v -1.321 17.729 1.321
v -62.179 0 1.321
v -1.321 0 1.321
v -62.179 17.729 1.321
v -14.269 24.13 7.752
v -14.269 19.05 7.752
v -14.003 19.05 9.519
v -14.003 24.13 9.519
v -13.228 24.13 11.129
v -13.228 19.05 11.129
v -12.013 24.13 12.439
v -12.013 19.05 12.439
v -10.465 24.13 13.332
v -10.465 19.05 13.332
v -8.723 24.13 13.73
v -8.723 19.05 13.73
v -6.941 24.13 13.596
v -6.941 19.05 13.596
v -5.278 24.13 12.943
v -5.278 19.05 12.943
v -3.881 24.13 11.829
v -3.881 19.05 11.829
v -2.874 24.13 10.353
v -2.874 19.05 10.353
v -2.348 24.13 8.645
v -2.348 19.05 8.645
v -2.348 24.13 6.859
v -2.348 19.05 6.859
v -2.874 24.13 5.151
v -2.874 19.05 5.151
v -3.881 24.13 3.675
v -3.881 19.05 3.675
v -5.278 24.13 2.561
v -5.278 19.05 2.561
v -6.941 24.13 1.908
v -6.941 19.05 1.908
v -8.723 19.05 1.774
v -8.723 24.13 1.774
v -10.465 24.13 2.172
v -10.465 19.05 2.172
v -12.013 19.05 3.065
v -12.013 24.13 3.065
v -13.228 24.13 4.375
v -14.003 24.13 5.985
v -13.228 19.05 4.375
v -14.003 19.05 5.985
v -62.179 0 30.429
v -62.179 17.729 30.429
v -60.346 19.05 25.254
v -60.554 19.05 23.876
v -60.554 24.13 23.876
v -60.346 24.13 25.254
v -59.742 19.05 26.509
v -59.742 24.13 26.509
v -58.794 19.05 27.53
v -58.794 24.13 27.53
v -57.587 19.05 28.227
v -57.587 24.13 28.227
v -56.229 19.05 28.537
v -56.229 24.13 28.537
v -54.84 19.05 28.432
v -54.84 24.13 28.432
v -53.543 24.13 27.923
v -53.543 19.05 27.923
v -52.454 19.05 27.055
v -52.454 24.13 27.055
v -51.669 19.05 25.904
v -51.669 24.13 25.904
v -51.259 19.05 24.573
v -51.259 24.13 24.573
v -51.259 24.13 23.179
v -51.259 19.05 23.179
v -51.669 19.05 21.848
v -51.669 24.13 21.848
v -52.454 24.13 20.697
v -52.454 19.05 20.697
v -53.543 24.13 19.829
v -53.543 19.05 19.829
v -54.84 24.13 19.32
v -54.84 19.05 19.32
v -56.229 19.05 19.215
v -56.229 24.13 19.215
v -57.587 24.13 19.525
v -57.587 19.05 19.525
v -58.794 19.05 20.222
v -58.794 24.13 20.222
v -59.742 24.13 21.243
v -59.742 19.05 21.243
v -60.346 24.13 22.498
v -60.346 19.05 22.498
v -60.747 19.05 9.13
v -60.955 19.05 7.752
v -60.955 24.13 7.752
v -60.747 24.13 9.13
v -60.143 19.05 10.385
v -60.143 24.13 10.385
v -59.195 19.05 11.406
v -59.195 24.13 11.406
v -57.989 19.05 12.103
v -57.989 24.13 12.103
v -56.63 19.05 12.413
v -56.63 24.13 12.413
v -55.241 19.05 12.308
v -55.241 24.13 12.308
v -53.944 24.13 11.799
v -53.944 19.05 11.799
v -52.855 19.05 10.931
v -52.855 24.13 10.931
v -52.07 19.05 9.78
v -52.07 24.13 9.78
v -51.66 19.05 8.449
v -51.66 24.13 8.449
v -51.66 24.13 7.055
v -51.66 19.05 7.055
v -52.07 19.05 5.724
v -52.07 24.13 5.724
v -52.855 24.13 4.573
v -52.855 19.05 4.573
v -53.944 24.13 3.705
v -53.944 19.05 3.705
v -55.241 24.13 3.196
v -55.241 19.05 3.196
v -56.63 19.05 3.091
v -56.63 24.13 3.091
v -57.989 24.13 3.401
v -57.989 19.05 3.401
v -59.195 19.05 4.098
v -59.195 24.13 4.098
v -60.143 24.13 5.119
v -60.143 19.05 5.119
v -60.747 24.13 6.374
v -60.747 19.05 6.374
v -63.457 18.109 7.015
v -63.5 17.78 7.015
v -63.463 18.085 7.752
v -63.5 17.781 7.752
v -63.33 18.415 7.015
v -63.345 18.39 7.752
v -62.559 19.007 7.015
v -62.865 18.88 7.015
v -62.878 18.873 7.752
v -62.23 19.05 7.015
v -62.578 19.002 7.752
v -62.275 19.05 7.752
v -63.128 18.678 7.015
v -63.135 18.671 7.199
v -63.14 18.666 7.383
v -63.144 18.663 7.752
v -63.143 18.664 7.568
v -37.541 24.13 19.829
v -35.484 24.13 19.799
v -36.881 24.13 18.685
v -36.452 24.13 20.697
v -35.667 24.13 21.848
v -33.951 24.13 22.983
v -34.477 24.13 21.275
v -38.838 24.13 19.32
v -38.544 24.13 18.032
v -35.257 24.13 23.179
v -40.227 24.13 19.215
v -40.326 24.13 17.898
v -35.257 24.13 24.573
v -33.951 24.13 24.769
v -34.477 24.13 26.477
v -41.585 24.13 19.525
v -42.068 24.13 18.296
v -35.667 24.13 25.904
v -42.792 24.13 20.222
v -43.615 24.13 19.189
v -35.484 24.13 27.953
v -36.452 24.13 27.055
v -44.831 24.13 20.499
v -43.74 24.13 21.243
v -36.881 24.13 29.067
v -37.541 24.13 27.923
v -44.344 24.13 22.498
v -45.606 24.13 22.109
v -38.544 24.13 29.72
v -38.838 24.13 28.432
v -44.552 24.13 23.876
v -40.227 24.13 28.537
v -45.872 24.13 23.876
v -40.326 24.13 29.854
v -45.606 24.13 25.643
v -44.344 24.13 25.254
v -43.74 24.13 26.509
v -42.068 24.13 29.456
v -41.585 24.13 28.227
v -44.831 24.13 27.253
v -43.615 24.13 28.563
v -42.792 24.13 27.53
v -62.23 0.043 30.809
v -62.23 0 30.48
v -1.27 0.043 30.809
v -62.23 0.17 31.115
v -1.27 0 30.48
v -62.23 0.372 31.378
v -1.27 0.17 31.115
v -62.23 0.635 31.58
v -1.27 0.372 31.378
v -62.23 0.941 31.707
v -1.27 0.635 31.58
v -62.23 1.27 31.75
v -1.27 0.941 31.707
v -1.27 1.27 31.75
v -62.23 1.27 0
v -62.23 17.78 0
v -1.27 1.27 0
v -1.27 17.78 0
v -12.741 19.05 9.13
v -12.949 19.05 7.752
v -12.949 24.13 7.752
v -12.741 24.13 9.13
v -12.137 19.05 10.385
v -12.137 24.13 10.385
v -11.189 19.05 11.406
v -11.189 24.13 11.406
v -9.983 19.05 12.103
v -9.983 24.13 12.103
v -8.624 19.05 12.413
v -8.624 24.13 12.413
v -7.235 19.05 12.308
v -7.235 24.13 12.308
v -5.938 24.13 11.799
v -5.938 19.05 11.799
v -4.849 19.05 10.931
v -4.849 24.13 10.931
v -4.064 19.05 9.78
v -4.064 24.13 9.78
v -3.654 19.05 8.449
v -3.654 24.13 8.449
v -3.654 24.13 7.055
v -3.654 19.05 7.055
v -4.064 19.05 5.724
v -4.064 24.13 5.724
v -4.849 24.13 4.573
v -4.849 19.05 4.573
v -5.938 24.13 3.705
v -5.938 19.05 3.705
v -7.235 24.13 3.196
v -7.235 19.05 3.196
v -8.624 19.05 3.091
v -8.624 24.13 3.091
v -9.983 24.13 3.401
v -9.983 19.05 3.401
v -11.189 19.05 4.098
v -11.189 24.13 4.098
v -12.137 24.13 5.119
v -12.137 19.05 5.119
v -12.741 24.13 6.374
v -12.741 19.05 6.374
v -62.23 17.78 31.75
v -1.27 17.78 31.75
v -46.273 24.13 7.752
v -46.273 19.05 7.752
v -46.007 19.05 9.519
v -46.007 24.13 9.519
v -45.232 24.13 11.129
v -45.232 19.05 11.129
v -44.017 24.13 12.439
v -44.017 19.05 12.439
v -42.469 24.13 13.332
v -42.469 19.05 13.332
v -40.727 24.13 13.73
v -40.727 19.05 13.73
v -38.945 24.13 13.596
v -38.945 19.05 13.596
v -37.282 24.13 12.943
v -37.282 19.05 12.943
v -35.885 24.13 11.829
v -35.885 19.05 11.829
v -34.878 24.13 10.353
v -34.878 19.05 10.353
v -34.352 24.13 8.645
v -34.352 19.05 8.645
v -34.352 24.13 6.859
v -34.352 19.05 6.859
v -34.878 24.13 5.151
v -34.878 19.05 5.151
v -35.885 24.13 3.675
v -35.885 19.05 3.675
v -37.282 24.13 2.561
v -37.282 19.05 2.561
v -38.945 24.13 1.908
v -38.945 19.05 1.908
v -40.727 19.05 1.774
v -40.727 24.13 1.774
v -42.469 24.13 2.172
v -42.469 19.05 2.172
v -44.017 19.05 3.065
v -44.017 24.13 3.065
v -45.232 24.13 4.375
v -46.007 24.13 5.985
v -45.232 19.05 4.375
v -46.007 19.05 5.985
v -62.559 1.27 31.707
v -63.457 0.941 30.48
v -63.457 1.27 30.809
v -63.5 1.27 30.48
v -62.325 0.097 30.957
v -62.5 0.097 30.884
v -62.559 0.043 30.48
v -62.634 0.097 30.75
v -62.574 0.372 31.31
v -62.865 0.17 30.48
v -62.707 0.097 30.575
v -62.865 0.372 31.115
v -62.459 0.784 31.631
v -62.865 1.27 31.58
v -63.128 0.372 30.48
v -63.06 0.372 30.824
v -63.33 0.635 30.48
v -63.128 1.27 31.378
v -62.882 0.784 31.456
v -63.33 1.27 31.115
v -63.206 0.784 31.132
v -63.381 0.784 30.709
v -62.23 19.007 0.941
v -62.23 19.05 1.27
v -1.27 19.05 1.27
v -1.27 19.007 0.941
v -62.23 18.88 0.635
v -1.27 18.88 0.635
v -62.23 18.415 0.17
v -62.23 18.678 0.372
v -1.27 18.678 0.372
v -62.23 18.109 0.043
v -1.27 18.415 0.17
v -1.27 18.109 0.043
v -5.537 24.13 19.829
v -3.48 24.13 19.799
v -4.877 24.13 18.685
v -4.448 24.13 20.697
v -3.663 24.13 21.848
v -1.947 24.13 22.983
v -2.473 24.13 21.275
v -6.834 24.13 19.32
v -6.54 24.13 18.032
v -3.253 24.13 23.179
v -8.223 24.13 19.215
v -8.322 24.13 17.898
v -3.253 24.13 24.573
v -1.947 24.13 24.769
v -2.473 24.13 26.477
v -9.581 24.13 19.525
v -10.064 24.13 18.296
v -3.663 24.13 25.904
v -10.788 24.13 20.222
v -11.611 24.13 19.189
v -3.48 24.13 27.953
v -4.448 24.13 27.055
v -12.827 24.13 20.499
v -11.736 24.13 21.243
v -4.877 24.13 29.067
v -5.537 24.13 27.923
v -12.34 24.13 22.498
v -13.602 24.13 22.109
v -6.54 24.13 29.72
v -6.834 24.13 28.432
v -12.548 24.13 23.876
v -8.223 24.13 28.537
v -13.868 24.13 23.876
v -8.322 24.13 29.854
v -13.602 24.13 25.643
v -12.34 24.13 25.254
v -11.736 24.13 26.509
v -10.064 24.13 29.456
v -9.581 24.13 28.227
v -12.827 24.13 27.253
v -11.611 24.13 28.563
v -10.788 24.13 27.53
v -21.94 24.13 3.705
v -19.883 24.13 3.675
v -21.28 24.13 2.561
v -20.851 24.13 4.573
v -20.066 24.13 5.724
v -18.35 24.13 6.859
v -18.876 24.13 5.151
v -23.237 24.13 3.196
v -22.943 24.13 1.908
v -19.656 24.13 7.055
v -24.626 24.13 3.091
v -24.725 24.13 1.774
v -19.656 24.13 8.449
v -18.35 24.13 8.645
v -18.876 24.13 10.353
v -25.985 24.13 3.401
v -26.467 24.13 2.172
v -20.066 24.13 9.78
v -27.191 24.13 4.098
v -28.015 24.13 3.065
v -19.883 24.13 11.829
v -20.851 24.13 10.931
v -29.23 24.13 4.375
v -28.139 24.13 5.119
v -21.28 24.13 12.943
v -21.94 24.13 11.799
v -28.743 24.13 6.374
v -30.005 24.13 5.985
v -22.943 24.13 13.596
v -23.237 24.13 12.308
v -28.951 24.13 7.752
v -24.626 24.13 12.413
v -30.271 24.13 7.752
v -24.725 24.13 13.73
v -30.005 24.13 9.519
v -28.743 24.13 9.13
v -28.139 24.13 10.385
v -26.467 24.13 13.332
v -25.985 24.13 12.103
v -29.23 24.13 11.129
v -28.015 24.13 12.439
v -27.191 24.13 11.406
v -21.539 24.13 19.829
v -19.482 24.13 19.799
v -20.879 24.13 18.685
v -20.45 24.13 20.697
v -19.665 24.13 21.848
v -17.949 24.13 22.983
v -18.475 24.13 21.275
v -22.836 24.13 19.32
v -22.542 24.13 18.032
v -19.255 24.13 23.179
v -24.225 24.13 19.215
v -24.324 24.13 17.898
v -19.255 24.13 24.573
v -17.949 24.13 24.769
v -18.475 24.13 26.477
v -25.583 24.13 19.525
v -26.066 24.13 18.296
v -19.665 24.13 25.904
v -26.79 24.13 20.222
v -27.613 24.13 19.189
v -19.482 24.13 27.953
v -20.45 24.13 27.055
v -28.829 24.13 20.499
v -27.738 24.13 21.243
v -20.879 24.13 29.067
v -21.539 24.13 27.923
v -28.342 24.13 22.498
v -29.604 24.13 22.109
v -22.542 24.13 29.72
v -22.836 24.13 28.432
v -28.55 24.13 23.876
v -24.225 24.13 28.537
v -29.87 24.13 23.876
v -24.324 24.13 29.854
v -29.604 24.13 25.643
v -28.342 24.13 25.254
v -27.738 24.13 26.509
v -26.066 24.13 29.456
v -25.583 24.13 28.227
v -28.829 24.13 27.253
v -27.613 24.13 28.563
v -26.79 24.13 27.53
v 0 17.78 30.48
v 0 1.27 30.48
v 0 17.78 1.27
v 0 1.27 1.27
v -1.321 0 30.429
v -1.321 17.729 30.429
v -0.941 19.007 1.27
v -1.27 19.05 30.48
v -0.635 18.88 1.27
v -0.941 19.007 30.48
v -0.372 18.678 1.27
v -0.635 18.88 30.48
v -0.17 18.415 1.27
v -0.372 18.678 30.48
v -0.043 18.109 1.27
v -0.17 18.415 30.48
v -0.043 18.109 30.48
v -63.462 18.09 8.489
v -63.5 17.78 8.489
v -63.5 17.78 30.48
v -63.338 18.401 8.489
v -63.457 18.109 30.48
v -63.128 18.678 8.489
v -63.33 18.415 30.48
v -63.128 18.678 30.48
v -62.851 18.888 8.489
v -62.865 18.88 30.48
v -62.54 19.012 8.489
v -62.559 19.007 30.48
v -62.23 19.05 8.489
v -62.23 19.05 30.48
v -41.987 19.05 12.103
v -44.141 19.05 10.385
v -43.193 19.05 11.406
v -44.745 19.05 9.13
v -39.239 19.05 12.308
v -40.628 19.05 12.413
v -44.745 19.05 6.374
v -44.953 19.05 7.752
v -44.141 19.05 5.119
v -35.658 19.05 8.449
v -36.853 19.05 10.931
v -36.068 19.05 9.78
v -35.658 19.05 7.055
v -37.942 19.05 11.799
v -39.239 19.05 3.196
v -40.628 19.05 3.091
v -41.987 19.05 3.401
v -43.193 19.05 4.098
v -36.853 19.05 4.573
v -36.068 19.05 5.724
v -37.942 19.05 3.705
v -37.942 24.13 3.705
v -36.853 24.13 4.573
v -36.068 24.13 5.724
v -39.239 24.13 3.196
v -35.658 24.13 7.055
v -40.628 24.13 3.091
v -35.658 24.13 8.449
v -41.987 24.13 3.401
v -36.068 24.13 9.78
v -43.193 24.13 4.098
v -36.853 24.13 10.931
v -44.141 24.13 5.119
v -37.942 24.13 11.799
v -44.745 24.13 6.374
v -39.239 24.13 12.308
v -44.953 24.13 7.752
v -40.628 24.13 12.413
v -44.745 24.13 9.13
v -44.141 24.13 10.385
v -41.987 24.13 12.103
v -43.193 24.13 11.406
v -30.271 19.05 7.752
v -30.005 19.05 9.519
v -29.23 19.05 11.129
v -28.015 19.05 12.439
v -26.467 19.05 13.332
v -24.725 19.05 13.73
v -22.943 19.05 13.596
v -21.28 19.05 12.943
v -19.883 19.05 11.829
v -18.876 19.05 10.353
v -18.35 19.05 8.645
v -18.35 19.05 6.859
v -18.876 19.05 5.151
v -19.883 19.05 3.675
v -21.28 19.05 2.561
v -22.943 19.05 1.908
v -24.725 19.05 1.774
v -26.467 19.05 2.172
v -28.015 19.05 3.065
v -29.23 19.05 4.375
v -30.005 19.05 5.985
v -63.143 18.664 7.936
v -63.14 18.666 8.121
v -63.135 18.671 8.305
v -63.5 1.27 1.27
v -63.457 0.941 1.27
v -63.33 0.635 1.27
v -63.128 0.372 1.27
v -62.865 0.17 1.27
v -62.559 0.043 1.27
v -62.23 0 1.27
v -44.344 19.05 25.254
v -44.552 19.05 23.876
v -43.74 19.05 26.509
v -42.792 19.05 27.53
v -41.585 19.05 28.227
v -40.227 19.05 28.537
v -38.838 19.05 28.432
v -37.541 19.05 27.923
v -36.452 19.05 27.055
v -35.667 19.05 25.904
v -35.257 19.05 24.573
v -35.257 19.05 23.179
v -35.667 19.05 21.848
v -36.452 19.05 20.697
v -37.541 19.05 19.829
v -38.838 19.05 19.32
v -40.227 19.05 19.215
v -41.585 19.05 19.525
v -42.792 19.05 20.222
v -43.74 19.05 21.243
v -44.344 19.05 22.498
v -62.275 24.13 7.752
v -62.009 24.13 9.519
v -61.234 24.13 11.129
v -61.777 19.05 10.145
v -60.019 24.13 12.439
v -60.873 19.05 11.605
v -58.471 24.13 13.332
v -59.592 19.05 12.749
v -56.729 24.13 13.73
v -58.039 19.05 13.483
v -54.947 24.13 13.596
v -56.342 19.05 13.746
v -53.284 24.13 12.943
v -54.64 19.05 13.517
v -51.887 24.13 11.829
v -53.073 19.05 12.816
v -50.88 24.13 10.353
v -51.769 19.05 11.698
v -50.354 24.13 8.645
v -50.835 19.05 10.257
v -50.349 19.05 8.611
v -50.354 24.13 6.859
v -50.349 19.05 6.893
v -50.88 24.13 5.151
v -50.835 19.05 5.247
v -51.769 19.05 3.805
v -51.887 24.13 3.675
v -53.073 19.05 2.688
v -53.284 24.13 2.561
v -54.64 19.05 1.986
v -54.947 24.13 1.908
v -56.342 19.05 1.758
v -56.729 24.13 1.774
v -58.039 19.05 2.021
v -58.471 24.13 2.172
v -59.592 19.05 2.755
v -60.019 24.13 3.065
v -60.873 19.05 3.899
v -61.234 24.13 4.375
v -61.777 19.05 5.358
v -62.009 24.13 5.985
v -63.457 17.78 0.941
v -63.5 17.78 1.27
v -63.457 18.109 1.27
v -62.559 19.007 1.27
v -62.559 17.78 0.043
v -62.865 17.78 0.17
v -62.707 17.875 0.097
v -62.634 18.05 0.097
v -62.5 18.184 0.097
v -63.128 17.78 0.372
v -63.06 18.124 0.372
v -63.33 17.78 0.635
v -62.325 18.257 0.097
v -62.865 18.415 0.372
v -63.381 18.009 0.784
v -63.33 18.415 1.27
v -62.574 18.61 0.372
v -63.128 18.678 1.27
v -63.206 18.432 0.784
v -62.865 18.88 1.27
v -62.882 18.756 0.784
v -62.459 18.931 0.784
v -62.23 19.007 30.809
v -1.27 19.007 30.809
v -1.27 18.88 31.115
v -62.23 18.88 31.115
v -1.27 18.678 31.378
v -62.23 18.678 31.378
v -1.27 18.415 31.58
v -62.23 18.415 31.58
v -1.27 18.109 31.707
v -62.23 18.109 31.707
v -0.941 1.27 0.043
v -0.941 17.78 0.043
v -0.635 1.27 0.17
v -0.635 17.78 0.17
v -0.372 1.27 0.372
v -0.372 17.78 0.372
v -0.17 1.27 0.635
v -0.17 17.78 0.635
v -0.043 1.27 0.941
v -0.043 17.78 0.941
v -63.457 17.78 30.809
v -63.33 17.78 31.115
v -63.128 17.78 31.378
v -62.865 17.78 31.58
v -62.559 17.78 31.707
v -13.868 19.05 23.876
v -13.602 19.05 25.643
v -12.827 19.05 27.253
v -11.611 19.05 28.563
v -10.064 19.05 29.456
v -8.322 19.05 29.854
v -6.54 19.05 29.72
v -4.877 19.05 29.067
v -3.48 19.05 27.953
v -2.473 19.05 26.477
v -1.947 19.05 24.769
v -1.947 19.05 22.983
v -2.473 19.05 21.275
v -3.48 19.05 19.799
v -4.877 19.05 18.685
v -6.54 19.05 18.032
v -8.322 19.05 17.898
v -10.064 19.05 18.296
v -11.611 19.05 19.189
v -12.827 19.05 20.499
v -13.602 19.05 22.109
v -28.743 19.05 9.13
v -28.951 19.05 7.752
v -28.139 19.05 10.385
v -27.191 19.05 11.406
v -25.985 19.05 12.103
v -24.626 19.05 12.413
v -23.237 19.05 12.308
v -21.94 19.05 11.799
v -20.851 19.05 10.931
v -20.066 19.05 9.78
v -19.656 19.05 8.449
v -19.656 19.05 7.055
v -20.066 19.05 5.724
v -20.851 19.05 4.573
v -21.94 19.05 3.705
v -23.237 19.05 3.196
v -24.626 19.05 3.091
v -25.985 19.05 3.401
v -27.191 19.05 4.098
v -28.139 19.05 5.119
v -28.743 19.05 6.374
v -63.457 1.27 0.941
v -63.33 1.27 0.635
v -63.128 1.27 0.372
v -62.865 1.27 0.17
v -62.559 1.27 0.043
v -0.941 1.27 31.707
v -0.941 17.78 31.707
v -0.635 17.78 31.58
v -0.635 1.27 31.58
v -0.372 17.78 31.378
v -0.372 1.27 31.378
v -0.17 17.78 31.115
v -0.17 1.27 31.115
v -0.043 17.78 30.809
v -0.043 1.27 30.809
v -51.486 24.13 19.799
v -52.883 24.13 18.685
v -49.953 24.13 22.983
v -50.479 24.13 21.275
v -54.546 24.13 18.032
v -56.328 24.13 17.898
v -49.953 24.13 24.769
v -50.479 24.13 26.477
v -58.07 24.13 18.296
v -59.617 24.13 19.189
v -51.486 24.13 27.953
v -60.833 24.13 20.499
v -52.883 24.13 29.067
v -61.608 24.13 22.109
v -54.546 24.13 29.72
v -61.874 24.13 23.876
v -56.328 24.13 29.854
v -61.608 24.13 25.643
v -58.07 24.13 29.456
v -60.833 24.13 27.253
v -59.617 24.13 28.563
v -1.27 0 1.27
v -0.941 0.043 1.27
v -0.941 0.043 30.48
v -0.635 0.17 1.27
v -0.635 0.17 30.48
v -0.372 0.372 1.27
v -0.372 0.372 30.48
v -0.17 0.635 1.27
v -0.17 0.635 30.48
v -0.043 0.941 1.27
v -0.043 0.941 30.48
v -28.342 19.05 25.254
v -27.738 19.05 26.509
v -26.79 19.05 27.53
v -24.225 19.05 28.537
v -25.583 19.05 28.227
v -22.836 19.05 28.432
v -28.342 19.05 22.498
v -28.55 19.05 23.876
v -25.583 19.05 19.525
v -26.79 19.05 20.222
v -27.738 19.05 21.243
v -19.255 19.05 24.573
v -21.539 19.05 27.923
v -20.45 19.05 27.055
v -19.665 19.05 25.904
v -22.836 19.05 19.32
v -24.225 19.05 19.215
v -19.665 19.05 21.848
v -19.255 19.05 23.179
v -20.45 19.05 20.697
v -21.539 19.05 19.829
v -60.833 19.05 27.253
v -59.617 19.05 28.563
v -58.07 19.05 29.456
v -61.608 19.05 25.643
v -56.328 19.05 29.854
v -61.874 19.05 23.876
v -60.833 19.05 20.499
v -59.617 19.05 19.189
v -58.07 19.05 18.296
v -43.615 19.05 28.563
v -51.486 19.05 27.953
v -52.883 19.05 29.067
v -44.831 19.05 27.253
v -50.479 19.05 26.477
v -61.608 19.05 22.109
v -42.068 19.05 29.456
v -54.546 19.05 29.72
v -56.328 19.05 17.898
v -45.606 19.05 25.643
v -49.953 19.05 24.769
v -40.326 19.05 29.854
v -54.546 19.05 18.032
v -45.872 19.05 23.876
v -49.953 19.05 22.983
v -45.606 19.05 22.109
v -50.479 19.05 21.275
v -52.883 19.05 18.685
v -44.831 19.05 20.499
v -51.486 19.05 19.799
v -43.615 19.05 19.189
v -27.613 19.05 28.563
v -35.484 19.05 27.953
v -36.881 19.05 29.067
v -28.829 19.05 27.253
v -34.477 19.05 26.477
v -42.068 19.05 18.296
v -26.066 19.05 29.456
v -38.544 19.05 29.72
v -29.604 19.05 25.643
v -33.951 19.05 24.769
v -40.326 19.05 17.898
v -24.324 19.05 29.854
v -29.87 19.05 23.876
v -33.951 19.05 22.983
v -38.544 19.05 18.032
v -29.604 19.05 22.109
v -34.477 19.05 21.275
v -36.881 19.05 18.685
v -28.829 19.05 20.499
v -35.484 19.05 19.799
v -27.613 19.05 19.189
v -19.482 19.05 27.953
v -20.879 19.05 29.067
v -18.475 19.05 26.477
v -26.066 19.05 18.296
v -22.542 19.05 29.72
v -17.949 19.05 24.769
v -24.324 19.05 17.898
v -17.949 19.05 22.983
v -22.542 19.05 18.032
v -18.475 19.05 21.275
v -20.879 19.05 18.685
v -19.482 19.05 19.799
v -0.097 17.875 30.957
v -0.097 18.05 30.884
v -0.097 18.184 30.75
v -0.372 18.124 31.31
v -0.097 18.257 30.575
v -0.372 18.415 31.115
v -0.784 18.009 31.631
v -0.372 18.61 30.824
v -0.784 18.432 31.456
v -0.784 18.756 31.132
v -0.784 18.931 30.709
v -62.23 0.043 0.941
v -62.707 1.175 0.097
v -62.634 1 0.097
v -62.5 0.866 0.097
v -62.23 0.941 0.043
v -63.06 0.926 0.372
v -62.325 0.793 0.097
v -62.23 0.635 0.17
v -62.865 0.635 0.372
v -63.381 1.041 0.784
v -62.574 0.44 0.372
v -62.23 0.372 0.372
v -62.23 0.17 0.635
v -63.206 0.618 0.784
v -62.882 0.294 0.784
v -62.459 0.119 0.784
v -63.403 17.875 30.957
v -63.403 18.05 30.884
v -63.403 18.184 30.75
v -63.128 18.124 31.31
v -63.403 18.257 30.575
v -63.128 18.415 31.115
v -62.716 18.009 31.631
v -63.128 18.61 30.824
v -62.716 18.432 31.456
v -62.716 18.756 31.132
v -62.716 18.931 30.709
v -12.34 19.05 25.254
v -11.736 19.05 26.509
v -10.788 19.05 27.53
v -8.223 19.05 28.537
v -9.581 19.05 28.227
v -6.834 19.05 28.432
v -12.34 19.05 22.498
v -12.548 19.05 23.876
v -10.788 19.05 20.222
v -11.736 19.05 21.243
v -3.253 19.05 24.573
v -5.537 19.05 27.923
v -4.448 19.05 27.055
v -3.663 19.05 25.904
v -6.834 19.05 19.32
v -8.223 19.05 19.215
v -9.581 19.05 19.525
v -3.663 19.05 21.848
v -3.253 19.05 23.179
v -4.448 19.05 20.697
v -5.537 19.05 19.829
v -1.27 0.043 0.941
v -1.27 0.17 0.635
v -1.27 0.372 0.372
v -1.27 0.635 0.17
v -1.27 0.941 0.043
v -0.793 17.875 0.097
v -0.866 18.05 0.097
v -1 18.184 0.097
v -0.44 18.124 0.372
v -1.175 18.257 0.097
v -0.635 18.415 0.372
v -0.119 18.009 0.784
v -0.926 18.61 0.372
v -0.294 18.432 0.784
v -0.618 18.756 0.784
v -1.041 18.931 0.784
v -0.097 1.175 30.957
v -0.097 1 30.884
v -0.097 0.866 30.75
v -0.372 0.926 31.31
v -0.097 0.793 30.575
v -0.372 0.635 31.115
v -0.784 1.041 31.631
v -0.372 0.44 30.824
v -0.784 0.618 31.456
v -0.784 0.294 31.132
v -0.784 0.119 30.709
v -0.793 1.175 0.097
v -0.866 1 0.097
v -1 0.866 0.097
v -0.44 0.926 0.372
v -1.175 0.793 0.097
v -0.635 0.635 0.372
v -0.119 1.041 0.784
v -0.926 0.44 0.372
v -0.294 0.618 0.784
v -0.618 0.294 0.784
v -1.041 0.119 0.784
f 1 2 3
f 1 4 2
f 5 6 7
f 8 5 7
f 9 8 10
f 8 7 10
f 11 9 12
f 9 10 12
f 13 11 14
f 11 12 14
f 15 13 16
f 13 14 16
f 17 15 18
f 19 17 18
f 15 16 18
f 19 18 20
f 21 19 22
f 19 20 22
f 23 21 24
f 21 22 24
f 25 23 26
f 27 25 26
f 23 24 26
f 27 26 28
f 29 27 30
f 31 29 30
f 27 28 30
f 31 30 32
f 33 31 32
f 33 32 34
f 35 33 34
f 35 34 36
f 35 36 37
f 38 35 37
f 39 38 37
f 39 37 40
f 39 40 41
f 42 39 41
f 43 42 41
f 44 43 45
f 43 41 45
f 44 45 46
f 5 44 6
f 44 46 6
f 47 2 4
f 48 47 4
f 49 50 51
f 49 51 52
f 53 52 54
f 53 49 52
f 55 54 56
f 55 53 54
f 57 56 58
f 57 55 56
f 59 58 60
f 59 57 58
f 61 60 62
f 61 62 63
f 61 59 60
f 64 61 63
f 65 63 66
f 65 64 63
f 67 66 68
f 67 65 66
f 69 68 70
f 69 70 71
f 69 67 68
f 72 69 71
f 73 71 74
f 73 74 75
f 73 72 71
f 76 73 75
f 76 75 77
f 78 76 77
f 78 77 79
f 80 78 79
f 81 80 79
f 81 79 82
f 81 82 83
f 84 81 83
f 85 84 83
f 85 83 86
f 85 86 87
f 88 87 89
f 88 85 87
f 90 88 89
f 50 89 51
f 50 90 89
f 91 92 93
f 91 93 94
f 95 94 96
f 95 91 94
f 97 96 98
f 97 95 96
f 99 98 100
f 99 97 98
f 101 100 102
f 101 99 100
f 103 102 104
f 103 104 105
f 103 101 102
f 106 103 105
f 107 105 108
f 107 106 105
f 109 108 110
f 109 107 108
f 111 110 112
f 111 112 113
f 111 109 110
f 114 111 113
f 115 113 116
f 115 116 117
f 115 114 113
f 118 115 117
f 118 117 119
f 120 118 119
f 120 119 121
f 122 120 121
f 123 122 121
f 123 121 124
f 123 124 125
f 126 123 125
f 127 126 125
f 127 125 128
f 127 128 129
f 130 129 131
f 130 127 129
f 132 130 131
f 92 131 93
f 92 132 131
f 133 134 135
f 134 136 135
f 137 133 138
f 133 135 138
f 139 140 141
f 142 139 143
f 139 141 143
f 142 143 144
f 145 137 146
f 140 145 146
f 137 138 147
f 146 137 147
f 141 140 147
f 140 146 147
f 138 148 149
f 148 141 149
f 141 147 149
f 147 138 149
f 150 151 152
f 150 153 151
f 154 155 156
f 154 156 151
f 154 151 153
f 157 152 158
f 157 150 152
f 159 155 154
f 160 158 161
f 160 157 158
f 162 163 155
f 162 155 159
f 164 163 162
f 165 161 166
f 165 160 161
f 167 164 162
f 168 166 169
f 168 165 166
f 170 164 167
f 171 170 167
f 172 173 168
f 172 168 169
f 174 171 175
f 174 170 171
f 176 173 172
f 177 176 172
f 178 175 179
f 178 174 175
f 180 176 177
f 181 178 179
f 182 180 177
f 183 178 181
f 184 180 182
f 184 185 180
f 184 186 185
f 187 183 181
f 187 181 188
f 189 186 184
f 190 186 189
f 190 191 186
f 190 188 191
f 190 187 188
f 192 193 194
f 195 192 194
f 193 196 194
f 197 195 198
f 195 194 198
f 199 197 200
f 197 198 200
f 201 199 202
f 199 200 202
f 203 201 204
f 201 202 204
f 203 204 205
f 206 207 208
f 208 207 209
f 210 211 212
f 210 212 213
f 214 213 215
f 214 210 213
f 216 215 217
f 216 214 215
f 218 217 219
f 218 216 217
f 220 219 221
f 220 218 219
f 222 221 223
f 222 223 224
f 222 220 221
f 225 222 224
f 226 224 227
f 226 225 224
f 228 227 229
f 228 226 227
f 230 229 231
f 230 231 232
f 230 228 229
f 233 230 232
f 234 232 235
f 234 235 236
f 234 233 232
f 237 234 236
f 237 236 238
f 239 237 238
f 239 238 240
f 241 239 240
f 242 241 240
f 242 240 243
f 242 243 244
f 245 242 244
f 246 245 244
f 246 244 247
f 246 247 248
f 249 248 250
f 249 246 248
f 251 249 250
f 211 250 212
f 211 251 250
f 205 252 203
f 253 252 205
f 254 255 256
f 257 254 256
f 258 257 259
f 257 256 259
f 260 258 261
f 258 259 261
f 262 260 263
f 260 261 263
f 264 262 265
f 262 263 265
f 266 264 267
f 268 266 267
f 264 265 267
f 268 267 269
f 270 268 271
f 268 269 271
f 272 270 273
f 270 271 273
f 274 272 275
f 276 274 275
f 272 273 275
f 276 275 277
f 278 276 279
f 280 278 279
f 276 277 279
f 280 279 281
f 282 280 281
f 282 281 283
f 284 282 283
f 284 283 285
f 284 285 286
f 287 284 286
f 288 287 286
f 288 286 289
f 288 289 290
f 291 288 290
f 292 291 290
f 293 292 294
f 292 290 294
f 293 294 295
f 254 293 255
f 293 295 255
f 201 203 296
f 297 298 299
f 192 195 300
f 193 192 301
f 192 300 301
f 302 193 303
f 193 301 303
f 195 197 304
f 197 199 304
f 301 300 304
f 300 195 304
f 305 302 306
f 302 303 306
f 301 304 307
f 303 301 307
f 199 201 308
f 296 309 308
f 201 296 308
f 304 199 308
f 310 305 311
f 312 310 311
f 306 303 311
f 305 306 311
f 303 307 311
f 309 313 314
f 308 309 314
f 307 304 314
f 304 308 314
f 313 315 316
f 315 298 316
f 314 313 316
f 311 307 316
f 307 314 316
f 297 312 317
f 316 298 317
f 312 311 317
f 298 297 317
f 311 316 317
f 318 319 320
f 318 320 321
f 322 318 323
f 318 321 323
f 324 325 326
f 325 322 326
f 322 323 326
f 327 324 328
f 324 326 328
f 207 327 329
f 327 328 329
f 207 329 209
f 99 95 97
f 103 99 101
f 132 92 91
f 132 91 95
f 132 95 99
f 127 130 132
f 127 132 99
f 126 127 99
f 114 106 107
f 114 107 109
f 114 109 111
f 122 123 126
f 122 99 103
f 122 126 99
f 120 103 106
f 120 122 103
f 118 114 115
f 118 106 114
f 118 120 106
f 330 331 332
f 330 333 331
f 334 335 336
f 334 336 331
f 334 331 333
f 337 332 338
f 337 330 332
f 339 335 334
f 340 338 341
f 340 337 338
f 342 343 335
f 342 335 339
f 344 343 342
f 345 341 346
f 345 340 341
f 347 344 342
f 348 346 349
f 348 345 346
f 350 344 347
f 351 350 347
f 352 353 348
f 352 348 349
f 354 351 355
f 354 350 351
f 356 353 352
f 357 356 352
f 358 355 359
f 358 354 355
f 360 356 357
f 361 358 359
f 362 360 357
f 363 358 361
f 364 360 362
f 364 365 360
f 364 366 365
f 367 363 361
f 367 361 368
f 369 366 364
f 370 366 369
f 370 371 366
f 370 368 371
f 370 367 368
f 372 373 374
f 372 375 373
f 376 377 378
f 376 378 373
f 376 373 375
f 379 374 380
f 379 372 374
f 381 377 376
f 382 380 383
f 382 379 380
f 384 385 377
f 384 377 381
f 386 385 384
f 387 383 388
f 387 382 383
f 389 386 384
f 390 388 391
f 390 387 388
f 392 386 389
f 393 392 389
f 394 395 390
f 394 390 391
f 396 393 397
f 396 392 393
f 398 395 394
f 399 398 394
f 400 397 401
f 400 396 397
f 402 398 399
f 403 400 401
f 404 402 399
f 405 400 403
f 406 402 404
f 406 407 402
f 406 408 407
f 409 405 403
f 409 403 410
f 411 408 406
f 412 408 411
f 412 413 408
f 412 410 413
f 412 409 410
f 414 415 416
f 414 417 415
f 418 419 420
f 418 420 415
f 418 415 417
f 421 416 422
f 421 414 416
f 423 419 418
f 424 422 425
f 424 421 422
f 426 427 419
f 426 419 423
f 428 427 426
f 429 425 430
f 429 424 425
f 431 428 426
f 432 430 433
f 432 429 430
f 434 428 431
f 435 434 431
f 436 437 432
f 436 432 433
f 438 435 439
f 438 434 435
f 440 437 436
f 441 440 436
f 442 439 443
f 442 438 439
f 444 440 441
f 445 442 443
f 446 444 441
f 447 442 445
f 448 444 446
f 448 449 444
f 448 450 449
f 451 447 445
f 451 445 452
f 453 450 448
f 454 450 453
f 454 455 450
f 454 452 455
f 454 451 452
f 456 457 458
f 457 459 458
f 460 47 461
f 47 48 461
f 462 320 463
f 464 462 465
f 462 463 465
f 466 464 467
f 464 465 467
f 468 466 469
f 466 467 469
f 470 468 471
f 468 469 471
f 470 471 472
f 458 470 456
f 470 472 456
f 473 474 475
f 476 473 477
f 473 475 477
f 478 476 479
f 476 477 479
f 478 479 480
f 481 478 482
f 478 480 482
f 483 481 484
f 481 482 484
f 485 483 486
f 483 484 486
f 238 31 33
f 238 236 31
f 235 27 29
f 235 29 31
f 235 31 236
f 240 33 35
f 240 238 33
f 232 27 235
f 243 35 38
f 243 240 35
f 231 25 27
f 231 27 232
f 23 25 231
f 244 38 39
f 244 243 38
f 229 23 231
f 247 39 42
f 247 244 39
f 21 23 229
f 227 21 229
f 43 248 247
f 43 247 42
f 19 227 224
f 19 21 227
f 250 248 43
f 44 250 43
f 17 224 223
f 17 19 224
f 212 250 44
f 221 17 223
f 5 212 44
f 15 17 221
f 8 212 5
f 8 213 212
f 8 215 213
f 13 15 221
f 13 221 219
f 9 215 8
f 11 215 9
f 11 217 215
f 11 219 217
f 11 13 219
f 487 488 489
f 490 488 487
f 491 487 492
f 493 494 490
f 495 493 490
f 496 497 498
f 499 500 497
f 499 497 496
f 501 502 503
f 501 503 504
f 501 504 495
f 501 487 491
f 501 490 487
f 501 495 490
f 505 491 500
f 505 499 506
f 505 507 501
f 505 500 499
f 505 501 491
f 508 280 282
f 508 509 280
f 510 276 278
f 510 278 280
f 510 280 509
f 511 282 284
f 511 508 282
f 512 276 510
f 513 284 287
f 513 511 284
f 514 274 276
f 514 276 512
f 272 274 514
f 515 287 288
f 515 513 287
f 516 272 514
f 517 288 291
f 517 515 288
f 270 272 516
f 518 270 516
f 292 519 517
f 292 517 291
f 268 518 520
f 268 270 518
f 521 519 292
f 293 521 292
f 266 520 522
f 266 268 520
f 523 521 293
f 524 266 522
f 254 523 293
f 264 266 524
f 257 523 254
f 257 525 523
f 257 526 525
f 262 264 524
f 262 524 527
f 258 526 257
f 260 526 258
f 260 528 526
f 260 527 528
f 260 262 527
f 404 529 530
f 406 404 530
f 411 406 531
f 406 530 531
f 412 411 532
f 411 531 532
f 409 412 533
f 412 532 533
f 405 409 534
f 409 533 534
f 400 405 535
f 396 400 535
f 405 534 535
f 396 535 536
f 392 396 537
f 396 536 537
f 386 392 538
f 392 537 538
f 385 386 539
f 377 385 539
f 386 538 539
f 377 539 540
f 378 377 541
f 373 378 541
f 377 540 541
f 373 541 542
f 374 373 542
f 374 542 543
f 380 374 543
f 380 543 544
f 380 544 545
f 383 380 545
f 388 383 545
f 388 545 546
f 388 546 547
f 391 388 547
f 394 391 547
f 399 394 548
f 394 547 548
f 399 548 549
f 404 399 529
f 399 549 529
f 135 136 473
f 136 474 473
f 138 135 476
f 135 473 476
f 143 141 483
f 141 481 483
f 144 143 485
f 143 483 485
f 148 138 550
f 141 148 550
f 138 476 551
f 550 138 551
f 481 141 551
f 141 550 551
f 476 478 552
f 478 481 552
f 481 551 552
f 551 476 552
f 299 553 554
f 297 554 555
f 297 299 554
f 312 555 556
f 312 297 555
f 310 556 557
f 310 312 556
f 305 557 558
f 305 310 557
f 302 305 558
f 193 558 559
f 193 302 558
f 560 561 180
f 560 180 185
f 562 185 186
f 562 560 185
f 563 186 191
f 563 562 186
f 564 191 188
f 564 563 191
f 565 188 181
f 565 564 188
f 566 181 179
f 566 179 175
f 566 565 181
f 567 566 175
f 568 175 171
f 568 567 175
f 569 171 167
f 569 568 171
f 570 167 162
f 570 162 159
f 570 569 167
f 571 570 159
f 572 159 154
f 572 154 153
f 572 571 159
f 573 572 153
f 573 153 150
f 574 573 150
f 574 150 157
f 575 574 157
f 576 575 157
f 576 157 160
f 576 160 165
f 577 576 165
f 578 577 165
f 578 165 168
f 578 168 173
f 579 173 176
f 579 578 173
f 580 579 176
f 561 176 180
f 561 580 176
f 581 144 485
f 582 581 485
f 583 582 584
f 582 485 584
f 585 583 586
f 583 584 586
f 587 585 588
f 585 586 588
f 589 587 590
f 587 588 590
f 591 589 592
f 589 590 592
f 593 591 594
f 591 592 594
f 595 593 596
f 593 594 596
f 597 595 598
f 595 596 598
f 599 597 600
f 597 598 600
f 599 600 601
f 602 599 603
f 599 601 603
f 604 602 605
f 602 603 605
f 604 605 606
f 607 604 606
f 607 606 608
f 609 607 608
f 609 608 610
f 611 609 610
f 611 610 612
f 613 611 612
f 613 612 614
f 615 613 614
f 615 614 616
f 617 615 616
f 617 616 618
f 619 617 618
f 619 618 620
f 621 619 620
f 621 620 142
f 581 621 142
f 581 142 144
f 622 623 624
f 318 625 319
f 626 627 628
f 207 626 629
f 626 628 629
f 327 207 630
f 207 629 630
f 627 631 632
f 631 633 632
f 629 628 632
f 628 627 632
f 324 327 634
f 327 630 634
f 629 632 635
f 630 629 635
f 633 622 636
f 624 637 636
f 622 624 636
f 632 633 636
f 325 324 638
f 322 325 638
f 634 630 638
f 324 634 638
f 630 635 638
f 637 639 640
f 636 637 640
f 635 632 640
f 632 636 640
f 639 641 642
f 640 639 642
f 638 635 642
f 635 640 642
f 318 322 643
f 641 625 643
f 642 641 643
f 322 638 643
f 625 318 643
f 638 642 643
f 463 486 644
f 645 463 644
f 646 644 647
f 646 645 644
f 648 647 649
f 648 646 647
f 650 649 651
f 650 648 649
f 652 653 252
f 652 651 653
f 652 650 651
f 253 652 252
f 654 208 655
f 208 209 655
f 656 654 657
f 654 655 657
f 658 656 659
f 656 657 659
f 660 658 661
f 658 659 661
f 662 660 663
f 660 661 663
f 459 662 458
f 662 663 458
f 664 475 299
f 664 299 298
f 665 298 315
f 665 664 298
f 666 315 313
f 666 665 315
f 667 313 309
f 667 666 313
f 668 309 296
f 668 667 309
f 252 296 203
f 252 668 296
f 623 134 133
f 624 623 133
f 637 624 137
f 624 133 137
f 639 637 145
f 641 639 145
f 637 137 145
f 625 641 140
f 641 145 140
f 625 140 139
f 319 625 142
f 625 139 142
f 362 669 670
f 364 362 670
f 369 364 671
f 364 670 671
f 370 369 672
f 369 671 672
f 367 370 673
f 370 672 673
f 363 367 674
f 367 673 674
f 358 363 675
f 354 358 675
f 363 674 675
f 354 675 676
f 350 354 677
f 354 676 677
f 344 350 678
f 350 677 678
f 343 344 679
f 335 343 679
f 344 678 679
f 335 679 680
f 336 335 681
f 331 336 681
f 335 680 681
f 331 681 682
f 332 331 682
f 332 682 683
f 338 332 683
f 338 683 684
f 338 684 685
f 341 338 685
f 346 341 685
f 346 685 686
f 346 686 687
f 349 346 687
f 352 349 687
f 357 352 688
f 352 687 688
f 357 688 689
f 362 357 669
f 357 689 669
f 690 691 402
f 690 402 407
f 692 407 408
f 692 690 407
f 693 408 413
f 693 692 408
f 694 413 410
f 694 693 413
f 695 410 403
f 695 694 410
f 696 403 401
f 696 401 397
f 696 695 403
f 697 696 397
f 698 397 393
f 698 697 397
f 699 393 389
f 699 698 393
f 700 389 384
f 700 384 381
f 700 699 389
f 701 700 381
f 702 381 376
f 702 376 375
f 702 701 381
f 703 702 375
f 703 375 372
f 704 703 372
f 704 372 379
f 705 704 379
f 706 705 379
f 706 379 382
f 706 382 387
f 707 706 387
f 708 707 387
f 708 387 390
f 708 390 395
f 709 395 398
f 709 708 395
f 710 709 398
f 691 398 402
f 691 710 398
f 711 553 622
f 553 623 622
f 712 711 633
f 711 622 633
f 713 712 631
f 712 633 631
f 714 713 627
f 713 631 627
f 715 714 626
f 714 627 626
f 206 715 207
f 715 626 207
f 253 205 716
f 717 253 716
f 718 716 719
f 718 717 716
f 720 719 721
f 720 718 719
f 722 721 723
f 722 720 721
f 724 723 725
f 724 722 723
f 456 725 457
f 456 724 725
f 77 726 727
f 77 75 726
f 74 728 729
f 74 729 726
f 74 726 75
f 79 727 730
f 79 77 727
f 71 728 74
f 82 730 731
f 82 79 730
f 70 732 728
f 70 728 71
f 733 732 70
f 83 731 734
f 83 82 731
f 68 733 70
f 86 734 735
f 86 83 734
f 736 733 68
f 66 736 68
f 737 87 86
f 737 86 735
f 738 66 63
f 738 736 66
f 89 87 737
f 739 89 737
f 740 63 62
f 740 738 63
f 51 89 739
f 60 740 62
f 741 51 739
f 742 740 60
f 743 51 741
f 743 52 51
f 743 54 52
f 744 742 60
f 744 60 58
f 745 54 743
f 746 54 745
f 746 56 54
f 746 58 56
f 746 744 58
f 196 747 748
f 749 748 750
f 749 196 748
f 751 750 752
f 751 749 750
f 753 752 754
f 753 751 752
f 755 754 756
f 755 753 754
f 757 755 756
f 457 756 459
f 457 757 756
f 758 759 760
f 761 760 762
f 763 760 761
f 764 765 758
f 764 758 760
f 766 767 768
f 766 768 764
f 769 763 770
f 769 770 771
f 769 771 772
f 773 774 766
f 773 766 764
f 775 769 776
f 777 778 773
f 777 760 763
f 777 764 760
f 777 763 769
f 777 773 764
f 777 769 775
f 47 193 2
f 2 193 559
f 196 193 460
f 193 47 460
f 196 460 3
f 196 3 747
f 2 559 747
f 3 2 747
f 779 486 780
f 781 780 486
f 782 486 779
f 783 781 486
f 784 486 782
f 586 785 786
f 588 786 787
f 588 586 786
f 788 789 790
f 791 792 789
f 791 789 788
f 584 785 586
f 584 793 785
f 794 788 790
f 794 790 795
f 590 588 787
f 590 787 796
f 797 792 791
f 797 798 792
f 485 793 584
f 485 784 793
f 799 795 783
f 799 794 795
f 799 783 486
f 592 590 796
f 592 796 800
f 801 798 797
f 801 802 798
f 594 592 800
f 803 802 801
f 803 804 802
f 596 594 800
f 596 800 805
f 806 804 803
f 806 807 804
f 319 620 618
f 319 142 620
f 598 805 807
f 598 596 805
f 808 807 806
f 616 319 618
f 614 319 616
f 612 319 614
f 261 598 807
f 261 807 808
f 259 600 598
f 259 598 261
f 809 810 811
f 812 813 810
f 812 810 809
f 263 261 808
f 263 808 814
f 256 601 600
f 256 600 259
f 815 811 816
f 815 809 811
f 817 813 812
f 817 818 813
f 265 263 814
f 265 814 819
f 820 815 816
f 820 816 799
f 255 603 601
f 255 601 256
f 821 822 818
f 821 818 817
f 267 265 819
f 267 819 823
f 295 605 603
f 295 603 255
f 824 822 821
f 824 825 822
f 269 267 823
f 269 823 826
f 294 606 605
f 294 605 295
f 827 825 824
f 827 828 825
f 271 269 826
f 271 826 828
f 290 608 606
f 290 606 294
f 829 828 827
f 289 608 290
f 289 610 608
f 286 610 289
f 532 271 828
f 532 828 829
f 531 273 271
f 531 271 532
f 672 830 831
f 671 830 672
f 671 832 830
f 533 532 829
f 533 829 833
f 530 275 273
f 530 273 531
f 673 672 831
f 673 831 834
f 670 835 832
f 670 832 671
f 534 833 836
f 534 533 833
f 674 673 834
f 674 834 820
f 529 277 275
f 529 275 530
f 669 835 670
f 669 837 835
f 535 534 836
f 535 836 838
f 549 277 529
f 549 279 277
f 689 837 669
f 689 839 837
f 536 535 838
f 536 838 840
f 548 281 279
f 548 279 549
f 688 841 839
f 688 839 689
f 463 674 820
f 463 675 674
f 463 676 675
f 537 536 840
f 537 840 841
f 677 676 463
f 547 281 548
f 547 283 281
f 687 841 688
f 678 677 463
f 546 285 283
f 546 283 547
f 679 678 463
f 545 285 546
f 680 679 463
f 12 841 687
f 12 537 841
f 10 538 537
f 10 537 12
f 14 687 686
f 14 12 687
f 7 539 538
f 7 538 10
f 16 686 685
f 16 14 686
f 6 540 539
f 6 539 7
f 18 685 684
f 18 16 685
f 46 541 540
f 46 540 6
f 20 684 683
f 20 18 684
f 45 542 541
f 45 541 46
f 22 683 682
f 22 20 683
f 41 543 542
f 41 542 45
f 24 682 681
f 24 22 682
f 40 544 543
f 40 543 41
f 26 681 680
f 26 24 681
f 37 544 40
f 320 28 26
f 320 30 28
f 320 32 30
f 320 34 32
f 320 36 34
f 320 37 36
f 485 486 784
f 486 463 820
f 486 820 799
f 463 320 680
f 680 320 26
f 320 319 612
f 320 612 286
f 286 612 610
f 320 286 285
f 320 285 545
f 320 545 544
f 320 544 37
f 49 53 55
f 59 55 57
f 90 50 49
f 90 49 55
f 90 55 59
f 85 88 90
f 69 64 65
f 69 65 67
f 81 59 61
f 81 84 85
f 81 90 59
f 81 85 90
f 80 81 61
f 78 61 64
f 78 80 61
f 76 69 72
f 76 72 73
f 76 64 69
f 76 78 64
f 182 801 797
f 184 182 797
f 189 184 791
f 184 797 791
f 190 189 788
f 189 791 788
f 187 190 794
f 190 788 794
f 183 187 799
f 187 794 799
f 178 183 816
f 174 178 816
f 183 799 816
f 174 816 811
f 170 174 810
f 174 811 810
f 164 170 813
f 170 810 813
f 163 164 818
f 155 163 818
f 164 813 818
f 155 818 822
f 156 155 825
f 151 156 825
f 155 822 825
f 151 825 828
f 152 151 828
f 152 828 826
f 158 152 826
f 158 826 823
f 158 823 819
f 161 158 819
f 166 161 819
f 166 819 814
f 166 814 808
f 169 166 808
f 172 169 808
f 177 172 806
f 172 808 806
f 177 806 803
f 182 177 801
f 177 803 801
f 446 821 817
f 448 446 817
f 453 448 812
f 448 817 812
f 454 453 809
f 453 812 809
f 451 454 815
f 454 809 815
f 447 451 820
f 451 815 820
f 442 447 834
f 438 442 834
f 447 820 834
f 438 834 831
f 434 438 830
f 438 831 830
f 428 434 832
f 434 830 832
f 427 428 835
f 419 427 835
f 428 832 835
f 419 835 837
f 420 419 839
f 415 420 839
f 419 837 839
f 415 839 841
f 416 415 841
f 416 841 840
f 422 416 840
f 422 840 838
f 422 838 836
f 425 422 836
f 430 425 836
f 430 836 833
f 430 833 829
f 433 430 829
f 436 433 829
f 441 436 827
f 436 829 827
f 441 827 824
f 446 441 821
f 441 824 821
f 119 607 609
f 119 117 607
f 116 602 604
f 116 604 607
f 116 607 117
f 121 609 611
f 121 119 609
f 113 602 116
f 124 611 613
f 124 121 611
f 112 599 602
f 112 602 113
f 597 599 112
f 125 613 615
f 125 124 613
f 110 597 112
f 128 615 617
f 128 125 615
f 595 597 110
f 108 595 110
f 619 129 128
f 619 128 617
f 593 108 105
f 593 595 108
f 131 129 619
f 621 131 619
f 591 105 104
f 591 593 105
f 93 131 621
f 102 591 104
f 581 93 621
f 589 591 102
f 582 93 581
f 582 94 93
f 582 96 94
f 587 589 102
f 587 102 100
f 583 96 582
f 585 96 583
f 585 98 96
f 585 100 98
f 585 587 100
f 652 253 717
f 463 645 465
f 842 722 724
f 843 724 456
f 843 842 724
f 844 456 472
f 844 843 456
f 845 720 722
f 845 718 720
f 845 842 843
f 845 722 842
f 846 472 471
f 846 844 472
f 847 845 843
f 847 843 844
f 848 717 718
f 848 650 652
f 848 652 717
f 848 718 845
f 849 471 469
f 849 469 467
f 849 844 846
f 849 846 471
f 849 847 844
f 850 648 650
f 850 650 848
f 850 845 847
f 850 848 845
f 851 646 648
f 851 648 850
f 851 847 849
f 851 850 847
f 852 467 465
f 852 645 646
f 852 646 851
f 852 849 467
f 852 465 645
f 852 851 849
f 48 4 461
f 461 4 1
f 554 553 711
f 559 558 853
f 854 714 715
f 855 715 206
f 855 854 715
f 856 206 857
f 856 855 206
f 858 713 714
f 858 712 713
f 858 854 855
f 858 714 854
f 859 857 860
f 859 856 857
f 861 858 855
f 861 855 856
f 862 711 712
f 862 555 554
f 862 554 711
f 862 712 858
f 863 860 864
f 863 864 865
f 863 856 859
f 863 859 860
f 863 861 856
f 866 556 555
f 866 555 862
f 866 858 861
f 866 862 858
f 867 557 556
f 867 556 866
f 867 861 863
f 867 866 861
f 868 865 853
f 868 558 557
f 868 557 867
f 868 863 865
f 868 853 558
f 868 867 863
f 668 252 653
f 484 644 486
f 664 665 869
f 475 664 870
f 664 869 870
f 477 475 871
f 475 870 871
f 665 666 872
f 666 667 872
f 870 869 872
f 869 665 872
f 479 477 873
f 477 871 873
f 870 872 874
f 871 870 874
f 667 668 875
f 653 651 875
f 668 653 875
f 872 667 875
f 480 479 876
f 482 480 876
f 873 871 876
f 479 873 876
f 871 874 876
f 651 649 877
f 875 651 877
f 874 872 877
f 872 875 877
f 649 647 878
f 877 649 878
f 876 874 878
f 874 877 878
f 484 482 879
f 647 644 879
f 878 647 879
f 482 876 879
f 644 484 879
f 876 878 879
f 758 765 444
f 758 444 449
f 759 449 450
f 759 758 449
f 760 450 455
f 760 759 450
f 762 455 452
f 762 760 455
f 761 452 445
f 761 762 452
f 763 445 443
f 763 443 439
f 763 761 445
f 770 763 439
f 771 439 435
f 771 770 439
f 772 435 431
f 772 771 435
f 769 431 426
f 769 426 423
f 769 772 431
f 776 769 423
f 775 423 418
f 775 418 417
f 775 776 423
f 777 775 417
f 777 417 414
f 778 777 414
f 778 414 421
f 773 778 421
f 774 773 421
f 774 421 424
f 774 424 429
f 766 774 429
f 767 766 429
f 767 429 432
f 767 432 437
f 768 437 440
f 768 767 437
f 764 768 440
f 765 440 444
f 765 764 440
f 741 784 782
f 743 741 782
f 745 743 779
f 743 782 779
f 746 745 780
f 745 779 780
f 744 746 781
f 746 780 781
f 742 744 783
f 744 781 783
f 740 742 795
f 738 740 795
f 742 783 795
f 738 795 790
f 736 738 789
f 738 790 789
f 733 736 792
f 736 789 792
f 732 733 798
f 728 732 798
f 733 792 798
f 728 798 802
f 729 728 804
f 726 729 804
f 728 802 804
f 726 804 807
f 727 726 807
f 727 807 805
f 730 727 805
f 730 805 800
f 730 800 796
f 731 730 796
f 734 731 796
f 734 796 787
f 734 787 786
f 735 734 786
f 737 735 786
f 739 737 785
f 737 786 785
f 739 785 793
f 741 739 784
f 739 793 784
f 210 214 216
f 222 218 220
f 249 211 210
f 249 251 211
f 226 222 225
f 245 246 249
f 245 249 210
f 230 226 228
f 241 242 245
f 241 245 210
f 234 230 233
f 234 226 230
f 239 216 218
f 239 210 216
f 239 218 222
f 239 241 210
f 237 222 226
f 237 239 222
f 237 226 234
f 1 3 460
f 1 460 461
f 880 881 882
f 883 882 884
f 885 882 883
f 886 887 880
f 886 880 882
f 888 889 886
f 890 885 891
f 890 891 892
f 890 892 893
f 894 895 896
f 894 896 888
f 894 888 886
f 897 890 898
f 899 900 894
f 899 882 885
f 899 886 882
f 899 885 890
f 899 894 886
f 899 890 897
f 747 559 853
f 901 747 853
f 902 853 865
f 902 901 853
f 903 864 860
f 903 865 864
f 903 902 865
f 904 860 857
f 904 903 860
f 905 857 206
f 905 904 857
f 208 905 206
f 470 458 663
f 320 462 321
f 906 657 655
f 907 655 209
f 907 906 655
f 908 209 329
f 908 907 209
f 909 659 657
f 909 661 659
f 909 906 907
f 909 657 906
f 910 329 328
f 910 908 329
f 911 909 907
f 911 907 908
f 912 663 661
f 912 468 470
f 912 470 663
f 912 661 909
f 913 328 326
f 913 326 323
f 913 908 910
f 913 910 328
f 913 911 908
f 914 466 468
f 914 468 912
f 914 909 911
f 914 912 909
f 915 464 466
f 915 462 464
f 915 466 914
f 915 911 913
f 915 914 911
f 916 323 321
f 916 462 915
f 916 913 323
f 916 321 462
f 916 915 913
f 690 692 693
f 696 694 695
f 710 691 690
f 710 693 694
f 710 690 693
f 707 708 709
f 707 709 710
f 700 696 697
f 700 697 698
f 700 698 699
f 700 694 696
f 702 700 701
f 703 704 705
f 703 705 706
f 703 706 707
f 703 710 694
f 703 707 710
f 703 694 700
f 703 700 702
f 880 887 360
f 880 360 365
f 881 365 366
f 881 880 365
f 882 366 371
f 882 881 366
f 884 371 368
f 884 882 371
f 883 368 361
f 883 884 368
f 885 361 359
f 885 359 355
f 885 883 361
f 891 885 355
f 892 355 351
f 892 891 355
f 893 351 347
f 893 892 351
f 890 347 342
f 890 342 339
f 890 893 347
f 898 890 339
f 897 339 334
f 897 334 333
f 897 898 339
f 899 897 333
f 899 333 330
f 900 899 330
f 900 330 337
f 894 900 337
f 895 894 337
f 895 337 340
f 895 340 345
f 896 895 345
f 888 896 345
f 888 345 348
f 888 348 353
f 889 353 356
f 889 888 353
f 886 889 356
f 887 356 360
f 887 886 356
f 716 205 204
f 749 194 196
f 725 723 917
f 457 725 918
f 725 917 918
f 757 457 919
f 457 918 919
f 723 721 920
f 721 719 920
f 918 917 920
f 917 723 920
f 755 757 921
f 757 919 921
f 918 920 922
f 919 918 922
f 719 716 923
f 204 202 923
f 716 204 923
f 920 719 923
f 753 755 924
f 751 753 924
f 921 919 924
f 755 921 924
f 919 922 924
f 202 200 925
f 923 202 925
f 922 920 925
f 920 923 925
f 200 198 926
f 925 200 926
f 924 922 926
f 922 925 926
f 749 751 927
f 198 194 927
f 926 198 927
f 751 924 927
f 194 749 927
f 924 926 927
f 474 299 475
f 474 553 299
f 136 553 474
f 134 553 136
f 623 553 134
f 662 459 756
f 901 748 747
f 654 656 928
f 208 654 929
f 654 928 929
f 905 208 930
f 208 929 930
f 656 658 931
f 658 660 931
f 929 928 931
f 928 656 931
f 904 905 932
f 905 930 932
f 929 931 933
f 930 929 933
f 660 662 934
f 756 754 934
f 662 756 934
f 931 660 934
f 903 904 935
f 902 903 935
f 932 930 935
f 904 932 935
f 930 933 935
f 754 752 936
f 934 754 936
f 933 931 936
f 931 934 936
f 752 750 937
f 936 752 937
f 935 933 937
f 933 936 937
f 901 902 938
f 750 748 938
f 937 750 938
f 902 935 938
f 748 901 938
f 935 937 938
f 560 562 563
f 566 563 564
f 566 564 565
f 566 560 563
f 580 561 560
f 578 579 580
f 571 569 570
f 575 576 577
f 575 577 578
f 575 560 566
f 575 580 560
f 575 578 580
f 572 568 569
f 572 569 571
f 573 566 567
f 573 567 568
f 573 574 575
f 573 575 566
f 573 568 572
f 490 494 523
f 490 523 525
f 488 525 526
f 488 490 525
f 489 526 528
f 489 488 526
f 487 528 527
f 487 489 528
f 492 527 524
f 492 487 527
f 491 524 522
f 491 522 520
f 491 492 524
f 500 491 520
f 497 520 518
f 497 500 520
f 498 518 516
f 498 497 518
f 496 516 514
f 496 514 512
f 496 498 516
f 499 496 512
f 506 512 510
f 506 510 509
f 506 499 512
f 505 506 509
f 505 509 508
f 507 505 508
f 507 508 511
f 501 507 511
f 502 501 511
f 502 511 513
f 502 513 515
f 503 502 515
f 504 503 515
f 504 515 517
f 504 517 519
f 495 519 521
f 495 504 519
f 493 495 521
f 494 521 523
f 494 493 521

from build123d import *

# Parameters (mm, degrees)
F0_W     = 63.5
F0_H     = 19.05
F1_DEPTH = 31.75
F2_T     = -1.3208
F3_R     = 5.9944
F3_R_2   = 4.6736
F4_DEPTH = 5.08
F5_R     = 1.27


with BuildPart() as f1:
    # F0 (on Top) → F1 (new body)
    with BuildSketch(Plane.XY):
        with Locations((-31.75, 9.525)):
            Rectangle(F0_W, F0_H)
    extrude(amount=F1_DEPTH)

    # F2
    f2_openings = [f1.faces().sort_by_distance(p)[0] for p in [
        (-31.75, 0, 15.875),
    ]]
    offset(amount=F2_T, openings=f2_openings)

    # F3 (on face) → F4 (join)
    with BuildSketch(Plane(origin=(0, 19.05, 0), x_dir=(-1, 0, 0), z_dir=(0, 1, 0))):
        with Locations((7.874, 23.876)):
            Circle(F3_R)
        with Locations((7.874, 23.876)):
            Circle(F3_R_2, mode=Mode.SUBTRACT)
        with Locations((23.876, 23.876)):
            Circle(F3_R)
        with Locations((23.876, 23.876)):
            Circle(F3_R_2, mode=Mode.SUBTRACT)
        with Locations((39.878, 23.876)):
            Circle(F3_R)
        with Locations((39.878, 23.876)):
            Circle(F3_R_2, mode=Mode.SUBTRACT)
        with Locations((55.88, 23.876)):
            Circle(F3_R)
        with Locations((55.88, 23.876)):
            Circle(F3_R_2, mode=Mode.SUBTRACT)
        with Locations((8.275095, 7.751988)):
            Circle(F3_R)
        with Locations((8.275095, 7.751988)):
            Circle(F3_R_2, mode=Mode.SUBTRACT)
        with Locations((56.281095, 7.751988)):
            Circle(F3_R)
        with Locations((56.281095, 7.751988)):
            Circle(F3_R_2, mode=Mode.SUBTRACT)
        with Locations((40.279095, 7.751988)):
            Circle(F3_R)
        with Locations((40.279095, 7.751988)):
            Circle(F3_R_2, mode=Mode.SUBTRACT)
        with Locations((24.277095, 7.751988)):
            Circle(F3_R)
        with Locations((24.277095, 7.751988)):
            Circle(F3_R_2, mode=Mode.SUBTRACT)
    extrude(amount=F4_DEPTH)

    # F5
    f5_edges = [f1.edges().sort_by_distance(p)[0] for p in [
        (-31.75, 19.05, 31.75),
        (-63.5, 9.525, 31.75),
        (-31.75, 0, 31.75),
        (0, 9.525, 31.75),
        (-63.5, 19.05, 15.875),
        (-63.5, 0, 15.875),
        (-63.5, 9.525, 0),
        (0, 0, 15.875),
        (0, 19.05, 15.875),
        (0, 9.525, 0),
        (-31.75, 19.05, 0),
        (-31.75, 0, 0),
    ]]
    fillet(f5_edges, radius=F5_R)


solid = f1.part
